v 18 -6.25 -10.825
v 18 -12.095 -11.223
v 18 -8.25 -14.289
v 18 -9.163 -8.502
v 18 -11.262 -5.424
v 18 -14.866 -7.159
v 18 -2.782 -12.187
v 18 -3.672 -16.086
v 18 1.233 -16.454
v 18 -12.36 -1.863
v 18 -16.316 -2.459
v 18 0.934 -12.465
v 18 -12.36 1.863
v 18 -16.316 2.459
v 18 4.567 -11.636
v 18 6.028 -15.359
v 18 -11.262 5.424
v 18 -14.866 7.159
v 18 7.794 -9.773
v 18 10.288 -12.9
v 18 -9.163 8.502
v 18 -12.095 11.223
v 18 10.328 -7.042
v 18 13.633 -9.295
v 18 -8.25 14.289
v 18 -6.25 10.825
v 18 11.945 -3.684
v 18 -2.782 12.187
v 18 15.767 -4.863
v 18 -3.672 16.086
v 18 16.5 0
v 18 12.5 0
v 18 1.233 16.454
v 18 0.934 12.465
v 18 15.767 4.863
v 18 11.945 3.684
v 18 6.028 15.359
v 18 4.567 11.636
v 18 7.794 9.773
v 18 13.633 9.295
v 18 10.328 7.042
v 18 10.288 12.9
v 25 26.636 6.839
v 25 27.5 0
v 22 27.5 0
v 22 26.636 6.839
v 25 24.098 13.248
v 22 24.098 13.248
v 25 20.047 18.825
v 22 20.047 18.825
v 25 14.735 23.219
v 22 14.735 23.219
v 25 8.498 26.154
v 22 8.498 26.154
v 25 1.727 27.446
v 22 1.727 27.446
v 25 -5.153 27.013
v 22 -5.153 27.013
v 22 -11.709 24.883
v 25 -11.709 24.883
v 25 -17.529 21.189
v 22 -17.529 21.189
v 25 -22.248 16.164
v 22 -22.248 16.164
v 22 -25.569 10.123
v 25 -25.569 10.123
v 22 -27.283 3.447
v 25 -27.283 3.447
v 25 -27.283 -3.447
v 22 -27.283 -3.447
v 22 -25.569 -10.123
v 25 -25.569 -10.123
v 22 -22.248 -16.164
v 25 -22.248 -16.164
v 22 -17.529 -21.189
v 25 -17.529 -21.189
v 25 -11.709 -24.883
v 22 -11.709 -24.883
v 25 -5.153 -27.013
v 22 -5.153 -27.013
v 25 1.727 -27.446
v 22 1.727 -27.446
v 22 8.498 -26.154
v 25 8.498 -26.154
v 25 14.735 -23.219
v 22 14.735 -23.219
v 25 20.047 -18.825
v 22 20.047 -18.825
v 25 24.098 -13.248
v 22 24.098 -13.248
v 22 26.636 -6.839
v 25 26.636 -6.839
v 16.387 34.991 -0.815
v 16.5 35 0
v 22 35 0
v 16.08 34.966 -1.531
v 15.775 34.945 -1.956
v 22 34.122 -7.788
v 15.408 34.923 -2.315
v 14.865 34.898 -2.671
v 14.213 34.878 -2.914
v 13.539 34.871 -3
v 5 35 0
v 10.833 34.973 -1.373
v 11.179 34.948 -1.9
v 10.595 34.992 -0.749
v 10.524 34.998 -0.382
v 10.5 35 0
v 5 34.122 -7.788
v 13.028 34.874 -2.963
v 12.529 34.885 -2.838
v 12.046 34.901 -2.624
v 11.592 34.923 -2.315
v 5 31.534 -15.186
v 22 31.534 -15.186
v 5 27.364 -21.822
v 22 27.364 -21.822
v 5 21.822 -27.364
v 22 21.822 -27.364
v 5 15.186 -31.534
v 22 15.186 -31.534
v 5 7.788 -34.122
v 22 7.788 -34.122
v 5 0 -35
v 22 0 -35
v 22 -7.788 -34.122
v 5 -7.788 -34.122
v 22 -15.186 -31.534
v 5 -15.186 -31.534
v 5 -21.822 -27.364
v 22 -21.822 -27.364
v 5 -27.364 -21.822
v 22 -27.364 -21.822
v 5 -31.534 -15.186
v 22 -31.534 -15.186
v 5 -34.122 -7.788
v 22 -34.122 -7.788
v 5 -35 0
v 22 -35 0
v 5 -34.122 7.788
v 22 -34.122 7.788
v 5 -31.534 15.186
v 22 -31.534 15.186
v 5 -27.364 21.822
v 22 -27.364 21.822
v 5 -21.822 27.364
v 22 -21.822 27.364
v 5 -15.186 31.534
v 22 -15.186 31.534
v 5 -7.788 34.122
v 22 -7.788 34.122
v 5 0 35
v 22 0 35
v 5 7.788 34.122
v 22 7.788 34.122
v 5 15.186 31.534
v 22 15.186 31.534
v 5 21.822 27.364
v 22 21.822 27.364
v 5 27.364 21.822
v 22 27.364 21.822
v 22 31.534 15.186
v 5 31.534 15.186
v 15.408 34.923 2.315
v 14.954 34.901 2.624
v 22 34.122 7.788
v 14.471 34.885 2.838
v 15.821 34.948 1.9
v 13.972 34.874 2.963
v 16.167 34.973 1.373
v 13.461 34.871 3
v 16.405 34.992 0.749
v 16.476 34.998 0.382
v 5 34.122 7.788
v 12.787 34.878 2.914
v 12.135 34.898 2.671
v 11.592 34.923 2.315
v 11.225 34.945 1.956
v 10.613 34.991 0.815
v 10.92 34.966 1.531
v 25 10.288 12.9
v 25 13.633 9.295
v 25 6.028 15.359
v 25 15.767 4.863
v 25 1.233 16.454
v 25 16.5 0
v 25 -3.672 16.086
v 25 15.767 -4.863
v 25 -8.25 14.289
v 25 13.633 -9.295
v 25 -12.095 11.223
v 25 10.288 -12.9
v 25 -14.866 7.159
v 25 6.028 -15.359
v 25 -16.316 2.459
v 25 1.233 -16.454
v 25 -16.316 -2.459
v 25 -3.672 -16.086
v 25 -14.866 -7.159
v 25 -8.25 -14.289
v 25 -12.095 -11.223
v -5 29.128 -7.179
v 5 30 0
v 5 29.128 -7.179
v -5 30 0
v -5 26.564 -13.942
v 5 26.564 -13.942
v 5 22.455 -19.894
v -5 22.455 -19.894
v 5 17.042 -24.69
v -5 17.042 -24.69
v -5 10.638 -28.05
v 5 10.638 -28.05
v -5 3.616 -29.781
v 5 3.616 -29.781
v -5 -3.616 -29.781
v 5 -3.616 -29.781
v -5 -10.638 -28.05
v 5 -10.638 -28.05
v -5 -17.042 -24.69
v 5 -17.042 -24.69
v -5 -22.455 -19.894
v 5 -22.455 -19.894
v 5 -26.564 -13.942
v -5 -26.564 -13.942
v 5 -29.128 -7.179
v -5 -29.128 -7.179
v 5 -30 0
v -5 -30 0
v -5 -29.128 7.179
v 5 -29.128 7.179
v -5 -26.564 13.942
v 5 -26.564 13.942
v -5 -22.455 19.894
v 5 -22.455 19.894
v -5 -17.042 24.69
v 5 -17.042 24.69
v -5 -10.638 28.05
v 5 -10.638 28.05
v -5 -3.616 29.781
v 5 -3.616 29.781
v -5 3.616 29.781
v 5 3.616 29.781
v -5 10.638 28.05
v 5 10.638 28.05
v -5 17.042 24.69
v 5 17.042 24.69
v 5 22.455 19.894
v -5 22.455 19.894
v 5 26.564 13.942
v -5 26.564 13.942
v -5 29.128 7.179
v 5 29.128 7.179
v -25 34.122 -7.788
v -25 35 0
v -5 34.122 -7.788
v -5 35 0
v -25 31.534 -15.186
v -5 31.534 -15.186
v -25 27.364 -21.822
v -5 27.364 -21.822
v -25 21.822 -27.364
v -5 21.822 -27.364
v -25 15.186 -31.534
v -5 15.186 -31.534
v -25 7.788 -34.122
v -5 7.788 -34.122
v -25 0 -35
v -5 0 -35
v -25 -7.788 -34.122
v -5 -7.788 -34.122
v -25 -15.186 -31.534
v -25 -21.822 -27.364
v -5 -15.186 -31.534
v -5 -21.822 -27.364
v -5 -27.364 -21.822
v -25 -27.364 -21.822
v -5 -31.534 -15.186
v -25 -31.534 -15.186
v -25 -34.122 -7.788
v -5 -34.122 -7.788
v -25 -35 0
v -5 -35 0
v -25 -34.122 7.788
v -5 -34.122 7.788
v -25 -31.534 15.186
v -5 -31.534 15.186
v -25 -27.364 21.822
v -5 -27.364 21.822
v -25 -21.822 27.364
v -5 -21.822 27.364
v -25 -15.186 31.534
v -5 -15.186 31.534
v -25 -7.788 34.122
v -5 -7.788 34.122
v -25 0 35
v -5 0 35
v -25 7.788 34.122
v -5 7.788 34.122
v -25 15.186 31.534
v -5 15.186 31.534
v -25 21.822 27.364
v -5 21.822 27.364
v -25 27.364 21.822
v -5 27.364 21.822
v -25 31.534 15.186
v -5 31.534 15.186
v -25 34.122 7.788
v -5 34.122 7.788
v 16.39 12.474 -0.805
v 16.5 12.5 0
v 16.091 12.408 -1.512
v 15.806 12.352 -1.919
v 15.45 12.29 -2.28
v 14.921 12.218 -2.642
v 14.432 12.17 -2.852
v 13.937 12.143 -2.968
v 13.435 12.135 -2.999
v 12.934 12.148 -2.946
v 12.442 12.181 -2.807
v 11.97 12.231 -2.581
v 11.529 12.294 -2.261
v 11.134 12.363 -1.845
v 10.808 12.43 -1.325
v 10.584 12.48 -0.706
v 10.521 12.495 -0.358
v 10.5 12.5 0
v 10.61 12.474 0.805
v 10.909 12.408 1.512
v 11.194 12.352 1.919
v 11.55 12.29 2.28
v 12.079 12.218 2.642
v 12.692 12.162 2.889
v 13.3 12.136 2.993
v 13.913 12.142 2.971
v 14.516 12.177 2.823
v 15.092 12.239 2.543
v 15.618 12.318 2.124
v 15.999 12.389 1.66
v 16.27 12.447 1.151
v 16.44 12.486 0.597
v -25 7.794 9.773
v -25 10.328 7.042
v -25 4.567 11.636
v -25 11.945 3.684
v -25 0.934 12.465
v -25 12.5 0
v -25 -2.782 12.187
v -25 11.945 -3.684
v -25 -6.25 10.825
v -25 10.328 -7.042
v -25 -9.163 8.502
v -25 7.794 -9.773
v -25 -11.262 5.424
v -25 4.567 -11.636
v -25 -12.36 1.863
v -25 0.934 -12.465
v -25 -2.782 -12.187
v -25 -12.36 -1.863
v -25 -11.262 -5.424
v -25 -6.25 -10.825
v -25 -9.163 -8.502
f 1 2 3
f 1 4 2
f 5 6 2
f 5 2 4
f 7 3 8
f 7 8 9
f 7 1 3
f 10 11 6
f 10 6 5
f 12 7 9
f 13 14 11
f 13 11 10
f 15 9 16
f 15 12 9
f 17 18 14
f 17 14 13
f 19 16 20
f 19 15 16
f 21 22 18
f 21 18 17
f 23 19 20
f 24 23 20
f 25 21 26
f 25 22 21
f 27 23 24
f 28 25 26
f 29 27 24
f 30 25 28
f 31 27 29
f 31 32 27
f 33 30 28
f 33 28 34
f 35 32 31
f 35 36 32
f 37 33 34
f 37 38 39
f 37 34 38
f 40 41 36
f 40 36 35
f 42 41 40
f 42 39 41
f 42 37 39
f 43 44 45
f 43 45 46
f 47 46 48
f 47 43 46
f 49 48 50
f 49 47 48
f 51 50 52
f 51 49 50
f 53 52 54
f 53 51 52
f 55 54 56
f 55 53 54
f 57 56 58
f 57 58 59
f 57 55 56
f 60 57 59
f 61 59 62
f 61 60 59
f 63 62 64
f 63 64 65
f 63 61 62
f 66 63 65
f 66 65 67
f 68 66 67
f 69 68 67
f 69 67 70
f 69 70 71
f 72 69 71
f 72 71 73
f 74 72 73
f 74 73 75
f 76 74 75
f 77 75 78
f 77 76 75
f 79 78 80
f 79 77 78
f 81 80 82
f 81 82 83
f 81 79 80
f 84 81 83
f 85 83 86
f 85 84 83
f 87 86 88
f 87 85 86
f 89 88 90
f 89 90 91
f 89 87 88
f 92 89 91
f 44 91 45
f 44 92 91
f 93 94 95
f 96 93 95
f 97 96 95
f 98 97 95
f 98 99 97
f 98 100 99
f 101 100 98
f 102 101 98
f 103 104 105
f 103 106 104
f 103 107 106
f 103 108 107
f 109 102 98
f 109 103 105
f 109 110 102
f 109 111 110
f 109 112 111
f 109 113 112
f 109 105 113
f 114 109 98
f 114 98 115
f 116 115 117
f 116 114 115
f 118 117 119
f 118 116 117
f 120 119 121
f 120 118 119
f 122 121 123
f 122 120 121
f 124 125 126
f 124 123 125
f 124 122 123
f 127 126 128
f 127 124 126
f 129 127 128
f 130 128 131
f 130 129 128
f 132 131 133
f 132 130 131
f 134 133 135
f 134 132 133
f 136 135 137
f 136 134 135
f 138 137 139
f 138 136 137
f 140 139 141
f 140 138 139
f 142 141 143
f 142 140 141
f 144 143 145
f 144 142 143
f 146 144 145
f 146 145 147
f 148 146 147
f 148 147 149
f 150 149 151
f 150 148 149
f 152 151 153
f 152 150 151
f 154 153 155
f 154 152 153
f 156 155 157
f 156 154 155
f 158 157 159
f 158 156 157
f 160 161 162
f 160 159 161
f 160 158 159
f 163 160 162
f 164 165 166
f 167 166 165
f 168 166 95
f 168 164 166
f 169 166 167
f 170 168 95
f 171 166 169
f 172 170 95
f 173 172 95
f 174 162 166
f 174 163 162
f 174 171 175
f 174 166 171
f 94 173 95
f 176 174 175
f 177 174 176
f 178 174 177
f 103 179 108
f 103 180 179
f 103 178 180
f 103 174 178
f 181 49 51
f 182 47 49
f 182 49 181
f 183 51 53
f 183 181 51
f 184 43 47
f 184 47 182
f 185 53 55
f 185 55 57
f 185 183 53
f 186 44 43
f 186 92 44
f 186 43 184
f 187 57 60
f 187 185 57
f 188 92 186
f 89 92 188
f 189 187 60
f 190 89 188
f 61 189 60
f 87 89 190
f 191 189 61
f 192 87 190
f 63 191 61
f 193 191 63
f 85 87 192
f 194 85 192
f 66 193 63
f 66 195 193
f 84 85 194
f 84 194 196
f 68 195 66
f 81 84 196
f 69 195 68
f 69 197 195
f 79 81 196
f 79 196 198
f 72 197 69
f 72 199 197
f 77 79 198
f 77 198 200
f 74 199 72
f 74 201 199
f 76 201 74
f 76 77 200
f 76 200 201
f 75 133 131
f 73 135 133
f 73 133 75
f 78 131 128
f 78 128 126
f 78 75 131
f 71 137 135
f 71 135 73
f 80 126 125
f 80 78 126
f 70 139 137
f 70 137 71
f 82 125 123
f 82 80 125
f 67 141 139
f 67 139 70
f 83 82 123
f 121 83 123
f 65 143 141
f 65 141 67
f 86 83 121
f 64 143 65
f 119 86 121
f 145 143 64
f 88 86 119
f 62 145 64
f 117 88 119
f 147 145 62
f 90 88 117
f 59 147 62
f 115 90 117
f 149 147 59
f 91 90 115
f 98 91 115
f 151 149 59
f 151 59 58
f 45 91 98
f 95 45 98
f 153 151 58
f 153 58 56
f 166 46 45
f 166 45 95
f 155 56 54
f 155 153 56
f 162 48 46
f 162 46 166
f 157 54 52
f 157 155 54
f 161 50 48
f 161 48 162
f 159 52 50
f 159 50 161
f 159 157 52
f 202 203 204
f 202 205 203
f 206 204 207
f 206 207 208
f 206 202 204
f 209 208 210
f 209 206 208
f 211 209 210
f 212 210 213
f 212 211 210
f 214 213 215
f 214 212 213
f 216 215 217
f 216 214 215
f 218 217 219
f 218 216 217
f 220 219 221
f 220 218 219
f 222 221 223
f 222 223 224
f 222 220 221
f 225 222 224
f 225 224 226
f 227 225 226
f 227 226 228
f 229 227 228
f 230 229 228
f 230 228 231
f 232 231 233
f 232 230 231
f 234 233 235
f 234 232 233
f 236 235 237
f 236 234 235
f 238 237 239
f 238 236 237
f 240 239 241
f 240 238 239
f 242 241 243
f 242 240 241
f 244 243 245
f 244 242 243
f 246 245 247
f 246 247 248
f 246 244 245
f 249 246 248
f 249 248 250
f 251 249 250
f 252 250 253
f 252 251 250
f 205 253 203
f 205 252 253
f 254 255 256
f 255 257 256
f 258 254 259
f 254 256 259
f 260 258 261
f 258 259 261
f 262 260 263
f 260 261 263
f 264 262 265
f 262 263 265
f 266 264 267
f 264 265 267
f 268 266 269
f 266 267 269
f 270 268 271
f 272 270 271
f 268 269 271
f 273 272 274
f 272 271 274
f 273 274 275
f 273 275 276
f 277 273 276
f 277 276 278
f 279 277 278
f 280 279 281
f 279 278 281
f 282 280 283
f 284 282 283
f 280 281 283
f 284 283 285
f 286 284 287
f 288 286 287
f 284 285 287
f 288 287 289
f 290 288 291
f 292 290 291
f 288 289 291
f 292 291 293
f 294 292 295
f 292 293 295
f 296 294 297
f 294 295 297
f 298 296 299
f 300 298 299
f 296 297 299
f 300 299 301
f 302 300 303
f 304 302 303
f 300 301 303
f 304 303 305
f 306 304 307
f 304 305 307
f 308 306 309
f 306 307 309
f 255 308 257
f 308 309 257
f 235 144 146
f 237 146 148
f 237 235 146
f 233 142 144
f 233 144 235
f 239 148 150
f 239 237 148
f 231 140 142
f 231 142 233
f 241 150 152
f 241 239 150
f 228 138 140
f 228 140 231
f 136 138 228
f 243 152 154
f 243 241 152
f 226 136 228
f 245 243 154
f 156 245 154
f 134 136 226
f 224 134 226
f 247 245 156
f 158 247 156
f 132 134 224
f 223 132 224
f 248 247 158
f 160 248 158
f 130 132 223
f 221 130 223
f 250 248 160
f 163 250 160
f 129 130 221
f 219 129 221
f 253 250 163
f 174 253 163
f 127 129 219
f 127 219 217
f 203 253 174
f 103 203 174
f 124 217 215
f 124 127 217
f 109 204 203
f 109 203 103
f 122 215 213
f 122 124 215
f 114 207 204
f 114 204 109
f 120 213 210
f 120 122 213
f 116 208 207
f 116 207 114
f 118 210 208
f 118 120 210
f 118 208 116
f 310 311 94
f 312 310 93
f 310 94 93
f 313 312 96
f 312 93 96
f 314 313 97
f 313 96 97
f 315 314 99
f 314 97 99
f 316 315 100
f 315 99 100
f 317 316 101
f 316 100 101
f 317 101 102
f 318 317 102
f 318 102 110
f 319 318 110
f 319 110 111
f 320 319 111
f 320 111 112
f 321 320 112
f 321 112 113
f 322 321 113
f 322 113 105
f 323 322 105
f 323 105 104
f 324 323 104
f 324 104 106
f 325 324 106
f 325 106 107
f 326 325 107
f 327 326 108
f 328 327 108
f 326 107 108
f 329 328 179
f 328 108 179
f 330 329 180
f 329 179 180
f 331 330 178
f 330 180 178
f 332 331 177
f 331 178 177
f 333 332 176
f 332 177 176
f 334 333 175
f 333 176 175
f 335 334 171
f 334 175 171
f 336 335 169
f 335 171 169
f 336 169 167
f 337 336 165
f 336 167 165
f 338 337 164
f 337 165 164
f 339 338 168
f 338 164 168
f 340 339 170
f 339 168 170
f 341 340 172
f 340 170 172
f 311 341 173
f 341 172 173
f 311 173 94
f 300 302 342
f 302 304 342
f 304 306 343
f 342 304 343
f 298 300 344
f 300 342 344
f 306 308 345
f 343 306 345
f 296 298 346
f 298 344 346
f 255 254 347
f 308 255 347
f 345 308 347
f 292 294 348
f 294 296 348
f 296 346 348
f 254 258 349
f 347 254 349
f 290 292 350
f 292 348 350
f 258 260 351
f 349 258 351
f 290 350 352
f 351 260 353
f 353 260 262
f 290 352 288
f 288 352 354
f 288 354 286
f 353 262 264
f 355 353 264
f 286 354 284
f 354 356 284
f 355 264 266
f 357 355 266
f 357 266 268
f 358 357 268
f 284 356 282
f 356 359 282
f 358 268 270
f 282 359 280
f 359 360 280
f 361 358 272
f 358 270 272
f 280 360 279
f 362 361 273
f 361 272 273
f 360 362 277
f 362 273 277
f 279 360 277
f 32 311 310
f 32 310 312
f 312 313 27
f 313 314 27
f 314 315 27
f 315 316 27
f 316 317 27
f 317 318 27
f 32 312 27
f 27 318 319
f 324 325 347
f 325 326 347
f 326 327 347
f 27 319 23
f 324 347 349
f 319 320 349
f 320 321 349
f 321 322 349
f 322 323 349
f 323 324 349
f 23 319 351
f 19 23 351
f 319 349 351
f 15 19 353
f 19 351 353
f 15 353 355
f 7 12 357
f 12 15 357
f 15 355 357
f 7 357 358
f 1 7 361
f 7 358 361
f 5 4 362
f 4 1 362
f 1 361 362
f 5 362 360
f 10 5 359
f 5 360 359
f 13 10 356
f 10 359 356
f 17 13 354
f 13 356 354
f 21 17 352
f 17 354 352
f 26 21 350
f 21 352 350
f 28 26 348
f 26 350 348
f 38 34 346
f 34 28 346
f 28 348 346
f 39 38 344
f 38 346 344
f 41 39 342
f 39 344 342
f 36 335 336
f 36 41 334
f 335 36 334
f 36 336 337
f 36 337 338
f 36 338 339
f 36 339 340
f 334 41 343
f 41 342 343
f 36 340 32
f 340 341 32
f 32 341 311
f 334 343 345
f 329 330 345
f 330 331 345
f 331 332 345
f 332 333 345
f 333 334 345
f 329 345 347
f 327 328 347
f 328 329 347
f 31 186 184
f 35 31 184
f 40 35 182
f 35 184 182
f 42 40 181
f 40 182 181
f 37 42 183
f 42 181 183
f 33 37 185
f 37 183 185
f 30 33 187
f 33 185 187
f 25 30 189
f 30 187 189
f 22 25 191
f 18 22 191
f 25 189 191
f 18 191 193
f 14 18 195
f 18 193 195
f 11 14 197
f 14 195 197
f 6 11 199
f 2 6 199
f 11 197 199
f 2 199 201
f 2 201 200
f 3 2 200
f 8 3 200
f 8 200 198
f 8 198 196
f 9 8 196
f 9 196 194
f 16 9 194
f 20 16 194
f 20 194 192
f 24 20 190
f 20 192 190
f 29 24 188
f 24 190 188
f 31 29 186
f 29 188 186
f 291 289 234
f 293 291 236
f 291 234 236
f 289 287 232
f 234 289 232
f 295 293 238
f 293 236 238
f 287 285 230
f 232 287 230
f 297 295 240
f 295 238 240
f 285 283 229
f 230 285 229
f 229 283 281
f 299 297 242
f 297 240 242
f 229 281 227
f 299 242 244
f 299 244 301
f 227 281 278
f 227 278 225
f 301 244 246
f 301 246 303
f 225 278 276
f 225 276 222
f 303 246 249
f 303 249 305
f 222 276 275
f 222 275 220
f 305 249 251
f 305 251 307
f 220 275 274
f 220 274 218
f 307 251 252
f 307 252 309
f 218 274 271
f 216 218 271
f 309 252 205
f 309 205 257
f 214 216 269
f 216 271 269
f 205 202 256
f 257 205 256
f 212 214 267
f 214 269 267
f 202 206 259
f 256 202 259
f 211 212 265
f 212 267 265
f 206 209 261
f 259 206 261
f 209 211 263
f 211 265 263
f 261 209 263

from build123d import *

# Parameters (mm, degrees)
SKETCH2_R          = 16.5
SKETCH2_R_2        = 12.5
CUT_EXTRUDE1_DEPTH = 7
SKETCH3_R          = 35
SKETCH3_R_2        = 27.5
CUT_EXTRUDE2_DEPTH = 3
SKETCH4_R          = 3
CUT_EXTRUDE4_DEPTH = 25


with BuildPart() as part:
    # Sketch1 → Revolve1 (revolve)
    with BuildSketch(Plane.XY):
        Polygon((0, 30), (0, 12.5), (25, 12.5), (25, 35), (5, 35), (5, 30), align=None)
    revolve(axis=Axis((25, 0, 0), (-1, 0, 0)))

    # Mirror1: part across plane


with BuildPart() as part_1:
    add(part.part)
    add(part.part.mirror(Plane(origin=(0, 0, 0), x_dir=(0, 0, 1), z_dir=(1, 0, 0))))

    # Sketch2 → Cut-Extrude1 (cut)
    with BuildSketch(Plane(origin=(25, 0, 0), x_dir=(0, 0, -1), z_dir=(1, 0, 0))):
        with Locations(Location((0, 0, 0), (0, 0, 90))):
            Circle(SKETCH2_R)
        with Locations(Location((0, 0, 0), (0, 0, 90))):
            Circle(SKETCH2_R_2, mode=Mode.SUBTRACT)
    extrude(amount=-CUT_EXTRUDE1_DEPTH, mode=Mode.SUBTRACT)

    # Sketch3 → Cut-Extrude2 (cut)
    with BuildSketch(Plane(origin=(25, 0, 0), x_dir=(0, 0, -1), z_dir=(1, 0, 0))):
        with Locations(Location((0, 0, 0), (0, 0, 90))):
            Circle(SKETCH3_R)
        with Locations(Location((0, 0, 0), (0, 0, 90))):
            Circle(SKETCH3_R_2, mode=Mode.SUBTRACT)
    extrude(amount=-CUT_EXTRUDE2_DEPTH, mode=Mode.SUBTRACT)

    # Sketch4 → Cut-Extrude4 (cut)
    with BuildSketch(Plane(origin=(0, 35, 0), x_dir=(1, 0, 0), z_dir=(0, 1, 0))):
        with Locations((13.5, 0)):
            Circle(SKETCH4_R)
    extrude(amount=-CUT_EXTRUDE4_DEPTH, mode=Mode.SUBTRACT)


solid = part_1.part
